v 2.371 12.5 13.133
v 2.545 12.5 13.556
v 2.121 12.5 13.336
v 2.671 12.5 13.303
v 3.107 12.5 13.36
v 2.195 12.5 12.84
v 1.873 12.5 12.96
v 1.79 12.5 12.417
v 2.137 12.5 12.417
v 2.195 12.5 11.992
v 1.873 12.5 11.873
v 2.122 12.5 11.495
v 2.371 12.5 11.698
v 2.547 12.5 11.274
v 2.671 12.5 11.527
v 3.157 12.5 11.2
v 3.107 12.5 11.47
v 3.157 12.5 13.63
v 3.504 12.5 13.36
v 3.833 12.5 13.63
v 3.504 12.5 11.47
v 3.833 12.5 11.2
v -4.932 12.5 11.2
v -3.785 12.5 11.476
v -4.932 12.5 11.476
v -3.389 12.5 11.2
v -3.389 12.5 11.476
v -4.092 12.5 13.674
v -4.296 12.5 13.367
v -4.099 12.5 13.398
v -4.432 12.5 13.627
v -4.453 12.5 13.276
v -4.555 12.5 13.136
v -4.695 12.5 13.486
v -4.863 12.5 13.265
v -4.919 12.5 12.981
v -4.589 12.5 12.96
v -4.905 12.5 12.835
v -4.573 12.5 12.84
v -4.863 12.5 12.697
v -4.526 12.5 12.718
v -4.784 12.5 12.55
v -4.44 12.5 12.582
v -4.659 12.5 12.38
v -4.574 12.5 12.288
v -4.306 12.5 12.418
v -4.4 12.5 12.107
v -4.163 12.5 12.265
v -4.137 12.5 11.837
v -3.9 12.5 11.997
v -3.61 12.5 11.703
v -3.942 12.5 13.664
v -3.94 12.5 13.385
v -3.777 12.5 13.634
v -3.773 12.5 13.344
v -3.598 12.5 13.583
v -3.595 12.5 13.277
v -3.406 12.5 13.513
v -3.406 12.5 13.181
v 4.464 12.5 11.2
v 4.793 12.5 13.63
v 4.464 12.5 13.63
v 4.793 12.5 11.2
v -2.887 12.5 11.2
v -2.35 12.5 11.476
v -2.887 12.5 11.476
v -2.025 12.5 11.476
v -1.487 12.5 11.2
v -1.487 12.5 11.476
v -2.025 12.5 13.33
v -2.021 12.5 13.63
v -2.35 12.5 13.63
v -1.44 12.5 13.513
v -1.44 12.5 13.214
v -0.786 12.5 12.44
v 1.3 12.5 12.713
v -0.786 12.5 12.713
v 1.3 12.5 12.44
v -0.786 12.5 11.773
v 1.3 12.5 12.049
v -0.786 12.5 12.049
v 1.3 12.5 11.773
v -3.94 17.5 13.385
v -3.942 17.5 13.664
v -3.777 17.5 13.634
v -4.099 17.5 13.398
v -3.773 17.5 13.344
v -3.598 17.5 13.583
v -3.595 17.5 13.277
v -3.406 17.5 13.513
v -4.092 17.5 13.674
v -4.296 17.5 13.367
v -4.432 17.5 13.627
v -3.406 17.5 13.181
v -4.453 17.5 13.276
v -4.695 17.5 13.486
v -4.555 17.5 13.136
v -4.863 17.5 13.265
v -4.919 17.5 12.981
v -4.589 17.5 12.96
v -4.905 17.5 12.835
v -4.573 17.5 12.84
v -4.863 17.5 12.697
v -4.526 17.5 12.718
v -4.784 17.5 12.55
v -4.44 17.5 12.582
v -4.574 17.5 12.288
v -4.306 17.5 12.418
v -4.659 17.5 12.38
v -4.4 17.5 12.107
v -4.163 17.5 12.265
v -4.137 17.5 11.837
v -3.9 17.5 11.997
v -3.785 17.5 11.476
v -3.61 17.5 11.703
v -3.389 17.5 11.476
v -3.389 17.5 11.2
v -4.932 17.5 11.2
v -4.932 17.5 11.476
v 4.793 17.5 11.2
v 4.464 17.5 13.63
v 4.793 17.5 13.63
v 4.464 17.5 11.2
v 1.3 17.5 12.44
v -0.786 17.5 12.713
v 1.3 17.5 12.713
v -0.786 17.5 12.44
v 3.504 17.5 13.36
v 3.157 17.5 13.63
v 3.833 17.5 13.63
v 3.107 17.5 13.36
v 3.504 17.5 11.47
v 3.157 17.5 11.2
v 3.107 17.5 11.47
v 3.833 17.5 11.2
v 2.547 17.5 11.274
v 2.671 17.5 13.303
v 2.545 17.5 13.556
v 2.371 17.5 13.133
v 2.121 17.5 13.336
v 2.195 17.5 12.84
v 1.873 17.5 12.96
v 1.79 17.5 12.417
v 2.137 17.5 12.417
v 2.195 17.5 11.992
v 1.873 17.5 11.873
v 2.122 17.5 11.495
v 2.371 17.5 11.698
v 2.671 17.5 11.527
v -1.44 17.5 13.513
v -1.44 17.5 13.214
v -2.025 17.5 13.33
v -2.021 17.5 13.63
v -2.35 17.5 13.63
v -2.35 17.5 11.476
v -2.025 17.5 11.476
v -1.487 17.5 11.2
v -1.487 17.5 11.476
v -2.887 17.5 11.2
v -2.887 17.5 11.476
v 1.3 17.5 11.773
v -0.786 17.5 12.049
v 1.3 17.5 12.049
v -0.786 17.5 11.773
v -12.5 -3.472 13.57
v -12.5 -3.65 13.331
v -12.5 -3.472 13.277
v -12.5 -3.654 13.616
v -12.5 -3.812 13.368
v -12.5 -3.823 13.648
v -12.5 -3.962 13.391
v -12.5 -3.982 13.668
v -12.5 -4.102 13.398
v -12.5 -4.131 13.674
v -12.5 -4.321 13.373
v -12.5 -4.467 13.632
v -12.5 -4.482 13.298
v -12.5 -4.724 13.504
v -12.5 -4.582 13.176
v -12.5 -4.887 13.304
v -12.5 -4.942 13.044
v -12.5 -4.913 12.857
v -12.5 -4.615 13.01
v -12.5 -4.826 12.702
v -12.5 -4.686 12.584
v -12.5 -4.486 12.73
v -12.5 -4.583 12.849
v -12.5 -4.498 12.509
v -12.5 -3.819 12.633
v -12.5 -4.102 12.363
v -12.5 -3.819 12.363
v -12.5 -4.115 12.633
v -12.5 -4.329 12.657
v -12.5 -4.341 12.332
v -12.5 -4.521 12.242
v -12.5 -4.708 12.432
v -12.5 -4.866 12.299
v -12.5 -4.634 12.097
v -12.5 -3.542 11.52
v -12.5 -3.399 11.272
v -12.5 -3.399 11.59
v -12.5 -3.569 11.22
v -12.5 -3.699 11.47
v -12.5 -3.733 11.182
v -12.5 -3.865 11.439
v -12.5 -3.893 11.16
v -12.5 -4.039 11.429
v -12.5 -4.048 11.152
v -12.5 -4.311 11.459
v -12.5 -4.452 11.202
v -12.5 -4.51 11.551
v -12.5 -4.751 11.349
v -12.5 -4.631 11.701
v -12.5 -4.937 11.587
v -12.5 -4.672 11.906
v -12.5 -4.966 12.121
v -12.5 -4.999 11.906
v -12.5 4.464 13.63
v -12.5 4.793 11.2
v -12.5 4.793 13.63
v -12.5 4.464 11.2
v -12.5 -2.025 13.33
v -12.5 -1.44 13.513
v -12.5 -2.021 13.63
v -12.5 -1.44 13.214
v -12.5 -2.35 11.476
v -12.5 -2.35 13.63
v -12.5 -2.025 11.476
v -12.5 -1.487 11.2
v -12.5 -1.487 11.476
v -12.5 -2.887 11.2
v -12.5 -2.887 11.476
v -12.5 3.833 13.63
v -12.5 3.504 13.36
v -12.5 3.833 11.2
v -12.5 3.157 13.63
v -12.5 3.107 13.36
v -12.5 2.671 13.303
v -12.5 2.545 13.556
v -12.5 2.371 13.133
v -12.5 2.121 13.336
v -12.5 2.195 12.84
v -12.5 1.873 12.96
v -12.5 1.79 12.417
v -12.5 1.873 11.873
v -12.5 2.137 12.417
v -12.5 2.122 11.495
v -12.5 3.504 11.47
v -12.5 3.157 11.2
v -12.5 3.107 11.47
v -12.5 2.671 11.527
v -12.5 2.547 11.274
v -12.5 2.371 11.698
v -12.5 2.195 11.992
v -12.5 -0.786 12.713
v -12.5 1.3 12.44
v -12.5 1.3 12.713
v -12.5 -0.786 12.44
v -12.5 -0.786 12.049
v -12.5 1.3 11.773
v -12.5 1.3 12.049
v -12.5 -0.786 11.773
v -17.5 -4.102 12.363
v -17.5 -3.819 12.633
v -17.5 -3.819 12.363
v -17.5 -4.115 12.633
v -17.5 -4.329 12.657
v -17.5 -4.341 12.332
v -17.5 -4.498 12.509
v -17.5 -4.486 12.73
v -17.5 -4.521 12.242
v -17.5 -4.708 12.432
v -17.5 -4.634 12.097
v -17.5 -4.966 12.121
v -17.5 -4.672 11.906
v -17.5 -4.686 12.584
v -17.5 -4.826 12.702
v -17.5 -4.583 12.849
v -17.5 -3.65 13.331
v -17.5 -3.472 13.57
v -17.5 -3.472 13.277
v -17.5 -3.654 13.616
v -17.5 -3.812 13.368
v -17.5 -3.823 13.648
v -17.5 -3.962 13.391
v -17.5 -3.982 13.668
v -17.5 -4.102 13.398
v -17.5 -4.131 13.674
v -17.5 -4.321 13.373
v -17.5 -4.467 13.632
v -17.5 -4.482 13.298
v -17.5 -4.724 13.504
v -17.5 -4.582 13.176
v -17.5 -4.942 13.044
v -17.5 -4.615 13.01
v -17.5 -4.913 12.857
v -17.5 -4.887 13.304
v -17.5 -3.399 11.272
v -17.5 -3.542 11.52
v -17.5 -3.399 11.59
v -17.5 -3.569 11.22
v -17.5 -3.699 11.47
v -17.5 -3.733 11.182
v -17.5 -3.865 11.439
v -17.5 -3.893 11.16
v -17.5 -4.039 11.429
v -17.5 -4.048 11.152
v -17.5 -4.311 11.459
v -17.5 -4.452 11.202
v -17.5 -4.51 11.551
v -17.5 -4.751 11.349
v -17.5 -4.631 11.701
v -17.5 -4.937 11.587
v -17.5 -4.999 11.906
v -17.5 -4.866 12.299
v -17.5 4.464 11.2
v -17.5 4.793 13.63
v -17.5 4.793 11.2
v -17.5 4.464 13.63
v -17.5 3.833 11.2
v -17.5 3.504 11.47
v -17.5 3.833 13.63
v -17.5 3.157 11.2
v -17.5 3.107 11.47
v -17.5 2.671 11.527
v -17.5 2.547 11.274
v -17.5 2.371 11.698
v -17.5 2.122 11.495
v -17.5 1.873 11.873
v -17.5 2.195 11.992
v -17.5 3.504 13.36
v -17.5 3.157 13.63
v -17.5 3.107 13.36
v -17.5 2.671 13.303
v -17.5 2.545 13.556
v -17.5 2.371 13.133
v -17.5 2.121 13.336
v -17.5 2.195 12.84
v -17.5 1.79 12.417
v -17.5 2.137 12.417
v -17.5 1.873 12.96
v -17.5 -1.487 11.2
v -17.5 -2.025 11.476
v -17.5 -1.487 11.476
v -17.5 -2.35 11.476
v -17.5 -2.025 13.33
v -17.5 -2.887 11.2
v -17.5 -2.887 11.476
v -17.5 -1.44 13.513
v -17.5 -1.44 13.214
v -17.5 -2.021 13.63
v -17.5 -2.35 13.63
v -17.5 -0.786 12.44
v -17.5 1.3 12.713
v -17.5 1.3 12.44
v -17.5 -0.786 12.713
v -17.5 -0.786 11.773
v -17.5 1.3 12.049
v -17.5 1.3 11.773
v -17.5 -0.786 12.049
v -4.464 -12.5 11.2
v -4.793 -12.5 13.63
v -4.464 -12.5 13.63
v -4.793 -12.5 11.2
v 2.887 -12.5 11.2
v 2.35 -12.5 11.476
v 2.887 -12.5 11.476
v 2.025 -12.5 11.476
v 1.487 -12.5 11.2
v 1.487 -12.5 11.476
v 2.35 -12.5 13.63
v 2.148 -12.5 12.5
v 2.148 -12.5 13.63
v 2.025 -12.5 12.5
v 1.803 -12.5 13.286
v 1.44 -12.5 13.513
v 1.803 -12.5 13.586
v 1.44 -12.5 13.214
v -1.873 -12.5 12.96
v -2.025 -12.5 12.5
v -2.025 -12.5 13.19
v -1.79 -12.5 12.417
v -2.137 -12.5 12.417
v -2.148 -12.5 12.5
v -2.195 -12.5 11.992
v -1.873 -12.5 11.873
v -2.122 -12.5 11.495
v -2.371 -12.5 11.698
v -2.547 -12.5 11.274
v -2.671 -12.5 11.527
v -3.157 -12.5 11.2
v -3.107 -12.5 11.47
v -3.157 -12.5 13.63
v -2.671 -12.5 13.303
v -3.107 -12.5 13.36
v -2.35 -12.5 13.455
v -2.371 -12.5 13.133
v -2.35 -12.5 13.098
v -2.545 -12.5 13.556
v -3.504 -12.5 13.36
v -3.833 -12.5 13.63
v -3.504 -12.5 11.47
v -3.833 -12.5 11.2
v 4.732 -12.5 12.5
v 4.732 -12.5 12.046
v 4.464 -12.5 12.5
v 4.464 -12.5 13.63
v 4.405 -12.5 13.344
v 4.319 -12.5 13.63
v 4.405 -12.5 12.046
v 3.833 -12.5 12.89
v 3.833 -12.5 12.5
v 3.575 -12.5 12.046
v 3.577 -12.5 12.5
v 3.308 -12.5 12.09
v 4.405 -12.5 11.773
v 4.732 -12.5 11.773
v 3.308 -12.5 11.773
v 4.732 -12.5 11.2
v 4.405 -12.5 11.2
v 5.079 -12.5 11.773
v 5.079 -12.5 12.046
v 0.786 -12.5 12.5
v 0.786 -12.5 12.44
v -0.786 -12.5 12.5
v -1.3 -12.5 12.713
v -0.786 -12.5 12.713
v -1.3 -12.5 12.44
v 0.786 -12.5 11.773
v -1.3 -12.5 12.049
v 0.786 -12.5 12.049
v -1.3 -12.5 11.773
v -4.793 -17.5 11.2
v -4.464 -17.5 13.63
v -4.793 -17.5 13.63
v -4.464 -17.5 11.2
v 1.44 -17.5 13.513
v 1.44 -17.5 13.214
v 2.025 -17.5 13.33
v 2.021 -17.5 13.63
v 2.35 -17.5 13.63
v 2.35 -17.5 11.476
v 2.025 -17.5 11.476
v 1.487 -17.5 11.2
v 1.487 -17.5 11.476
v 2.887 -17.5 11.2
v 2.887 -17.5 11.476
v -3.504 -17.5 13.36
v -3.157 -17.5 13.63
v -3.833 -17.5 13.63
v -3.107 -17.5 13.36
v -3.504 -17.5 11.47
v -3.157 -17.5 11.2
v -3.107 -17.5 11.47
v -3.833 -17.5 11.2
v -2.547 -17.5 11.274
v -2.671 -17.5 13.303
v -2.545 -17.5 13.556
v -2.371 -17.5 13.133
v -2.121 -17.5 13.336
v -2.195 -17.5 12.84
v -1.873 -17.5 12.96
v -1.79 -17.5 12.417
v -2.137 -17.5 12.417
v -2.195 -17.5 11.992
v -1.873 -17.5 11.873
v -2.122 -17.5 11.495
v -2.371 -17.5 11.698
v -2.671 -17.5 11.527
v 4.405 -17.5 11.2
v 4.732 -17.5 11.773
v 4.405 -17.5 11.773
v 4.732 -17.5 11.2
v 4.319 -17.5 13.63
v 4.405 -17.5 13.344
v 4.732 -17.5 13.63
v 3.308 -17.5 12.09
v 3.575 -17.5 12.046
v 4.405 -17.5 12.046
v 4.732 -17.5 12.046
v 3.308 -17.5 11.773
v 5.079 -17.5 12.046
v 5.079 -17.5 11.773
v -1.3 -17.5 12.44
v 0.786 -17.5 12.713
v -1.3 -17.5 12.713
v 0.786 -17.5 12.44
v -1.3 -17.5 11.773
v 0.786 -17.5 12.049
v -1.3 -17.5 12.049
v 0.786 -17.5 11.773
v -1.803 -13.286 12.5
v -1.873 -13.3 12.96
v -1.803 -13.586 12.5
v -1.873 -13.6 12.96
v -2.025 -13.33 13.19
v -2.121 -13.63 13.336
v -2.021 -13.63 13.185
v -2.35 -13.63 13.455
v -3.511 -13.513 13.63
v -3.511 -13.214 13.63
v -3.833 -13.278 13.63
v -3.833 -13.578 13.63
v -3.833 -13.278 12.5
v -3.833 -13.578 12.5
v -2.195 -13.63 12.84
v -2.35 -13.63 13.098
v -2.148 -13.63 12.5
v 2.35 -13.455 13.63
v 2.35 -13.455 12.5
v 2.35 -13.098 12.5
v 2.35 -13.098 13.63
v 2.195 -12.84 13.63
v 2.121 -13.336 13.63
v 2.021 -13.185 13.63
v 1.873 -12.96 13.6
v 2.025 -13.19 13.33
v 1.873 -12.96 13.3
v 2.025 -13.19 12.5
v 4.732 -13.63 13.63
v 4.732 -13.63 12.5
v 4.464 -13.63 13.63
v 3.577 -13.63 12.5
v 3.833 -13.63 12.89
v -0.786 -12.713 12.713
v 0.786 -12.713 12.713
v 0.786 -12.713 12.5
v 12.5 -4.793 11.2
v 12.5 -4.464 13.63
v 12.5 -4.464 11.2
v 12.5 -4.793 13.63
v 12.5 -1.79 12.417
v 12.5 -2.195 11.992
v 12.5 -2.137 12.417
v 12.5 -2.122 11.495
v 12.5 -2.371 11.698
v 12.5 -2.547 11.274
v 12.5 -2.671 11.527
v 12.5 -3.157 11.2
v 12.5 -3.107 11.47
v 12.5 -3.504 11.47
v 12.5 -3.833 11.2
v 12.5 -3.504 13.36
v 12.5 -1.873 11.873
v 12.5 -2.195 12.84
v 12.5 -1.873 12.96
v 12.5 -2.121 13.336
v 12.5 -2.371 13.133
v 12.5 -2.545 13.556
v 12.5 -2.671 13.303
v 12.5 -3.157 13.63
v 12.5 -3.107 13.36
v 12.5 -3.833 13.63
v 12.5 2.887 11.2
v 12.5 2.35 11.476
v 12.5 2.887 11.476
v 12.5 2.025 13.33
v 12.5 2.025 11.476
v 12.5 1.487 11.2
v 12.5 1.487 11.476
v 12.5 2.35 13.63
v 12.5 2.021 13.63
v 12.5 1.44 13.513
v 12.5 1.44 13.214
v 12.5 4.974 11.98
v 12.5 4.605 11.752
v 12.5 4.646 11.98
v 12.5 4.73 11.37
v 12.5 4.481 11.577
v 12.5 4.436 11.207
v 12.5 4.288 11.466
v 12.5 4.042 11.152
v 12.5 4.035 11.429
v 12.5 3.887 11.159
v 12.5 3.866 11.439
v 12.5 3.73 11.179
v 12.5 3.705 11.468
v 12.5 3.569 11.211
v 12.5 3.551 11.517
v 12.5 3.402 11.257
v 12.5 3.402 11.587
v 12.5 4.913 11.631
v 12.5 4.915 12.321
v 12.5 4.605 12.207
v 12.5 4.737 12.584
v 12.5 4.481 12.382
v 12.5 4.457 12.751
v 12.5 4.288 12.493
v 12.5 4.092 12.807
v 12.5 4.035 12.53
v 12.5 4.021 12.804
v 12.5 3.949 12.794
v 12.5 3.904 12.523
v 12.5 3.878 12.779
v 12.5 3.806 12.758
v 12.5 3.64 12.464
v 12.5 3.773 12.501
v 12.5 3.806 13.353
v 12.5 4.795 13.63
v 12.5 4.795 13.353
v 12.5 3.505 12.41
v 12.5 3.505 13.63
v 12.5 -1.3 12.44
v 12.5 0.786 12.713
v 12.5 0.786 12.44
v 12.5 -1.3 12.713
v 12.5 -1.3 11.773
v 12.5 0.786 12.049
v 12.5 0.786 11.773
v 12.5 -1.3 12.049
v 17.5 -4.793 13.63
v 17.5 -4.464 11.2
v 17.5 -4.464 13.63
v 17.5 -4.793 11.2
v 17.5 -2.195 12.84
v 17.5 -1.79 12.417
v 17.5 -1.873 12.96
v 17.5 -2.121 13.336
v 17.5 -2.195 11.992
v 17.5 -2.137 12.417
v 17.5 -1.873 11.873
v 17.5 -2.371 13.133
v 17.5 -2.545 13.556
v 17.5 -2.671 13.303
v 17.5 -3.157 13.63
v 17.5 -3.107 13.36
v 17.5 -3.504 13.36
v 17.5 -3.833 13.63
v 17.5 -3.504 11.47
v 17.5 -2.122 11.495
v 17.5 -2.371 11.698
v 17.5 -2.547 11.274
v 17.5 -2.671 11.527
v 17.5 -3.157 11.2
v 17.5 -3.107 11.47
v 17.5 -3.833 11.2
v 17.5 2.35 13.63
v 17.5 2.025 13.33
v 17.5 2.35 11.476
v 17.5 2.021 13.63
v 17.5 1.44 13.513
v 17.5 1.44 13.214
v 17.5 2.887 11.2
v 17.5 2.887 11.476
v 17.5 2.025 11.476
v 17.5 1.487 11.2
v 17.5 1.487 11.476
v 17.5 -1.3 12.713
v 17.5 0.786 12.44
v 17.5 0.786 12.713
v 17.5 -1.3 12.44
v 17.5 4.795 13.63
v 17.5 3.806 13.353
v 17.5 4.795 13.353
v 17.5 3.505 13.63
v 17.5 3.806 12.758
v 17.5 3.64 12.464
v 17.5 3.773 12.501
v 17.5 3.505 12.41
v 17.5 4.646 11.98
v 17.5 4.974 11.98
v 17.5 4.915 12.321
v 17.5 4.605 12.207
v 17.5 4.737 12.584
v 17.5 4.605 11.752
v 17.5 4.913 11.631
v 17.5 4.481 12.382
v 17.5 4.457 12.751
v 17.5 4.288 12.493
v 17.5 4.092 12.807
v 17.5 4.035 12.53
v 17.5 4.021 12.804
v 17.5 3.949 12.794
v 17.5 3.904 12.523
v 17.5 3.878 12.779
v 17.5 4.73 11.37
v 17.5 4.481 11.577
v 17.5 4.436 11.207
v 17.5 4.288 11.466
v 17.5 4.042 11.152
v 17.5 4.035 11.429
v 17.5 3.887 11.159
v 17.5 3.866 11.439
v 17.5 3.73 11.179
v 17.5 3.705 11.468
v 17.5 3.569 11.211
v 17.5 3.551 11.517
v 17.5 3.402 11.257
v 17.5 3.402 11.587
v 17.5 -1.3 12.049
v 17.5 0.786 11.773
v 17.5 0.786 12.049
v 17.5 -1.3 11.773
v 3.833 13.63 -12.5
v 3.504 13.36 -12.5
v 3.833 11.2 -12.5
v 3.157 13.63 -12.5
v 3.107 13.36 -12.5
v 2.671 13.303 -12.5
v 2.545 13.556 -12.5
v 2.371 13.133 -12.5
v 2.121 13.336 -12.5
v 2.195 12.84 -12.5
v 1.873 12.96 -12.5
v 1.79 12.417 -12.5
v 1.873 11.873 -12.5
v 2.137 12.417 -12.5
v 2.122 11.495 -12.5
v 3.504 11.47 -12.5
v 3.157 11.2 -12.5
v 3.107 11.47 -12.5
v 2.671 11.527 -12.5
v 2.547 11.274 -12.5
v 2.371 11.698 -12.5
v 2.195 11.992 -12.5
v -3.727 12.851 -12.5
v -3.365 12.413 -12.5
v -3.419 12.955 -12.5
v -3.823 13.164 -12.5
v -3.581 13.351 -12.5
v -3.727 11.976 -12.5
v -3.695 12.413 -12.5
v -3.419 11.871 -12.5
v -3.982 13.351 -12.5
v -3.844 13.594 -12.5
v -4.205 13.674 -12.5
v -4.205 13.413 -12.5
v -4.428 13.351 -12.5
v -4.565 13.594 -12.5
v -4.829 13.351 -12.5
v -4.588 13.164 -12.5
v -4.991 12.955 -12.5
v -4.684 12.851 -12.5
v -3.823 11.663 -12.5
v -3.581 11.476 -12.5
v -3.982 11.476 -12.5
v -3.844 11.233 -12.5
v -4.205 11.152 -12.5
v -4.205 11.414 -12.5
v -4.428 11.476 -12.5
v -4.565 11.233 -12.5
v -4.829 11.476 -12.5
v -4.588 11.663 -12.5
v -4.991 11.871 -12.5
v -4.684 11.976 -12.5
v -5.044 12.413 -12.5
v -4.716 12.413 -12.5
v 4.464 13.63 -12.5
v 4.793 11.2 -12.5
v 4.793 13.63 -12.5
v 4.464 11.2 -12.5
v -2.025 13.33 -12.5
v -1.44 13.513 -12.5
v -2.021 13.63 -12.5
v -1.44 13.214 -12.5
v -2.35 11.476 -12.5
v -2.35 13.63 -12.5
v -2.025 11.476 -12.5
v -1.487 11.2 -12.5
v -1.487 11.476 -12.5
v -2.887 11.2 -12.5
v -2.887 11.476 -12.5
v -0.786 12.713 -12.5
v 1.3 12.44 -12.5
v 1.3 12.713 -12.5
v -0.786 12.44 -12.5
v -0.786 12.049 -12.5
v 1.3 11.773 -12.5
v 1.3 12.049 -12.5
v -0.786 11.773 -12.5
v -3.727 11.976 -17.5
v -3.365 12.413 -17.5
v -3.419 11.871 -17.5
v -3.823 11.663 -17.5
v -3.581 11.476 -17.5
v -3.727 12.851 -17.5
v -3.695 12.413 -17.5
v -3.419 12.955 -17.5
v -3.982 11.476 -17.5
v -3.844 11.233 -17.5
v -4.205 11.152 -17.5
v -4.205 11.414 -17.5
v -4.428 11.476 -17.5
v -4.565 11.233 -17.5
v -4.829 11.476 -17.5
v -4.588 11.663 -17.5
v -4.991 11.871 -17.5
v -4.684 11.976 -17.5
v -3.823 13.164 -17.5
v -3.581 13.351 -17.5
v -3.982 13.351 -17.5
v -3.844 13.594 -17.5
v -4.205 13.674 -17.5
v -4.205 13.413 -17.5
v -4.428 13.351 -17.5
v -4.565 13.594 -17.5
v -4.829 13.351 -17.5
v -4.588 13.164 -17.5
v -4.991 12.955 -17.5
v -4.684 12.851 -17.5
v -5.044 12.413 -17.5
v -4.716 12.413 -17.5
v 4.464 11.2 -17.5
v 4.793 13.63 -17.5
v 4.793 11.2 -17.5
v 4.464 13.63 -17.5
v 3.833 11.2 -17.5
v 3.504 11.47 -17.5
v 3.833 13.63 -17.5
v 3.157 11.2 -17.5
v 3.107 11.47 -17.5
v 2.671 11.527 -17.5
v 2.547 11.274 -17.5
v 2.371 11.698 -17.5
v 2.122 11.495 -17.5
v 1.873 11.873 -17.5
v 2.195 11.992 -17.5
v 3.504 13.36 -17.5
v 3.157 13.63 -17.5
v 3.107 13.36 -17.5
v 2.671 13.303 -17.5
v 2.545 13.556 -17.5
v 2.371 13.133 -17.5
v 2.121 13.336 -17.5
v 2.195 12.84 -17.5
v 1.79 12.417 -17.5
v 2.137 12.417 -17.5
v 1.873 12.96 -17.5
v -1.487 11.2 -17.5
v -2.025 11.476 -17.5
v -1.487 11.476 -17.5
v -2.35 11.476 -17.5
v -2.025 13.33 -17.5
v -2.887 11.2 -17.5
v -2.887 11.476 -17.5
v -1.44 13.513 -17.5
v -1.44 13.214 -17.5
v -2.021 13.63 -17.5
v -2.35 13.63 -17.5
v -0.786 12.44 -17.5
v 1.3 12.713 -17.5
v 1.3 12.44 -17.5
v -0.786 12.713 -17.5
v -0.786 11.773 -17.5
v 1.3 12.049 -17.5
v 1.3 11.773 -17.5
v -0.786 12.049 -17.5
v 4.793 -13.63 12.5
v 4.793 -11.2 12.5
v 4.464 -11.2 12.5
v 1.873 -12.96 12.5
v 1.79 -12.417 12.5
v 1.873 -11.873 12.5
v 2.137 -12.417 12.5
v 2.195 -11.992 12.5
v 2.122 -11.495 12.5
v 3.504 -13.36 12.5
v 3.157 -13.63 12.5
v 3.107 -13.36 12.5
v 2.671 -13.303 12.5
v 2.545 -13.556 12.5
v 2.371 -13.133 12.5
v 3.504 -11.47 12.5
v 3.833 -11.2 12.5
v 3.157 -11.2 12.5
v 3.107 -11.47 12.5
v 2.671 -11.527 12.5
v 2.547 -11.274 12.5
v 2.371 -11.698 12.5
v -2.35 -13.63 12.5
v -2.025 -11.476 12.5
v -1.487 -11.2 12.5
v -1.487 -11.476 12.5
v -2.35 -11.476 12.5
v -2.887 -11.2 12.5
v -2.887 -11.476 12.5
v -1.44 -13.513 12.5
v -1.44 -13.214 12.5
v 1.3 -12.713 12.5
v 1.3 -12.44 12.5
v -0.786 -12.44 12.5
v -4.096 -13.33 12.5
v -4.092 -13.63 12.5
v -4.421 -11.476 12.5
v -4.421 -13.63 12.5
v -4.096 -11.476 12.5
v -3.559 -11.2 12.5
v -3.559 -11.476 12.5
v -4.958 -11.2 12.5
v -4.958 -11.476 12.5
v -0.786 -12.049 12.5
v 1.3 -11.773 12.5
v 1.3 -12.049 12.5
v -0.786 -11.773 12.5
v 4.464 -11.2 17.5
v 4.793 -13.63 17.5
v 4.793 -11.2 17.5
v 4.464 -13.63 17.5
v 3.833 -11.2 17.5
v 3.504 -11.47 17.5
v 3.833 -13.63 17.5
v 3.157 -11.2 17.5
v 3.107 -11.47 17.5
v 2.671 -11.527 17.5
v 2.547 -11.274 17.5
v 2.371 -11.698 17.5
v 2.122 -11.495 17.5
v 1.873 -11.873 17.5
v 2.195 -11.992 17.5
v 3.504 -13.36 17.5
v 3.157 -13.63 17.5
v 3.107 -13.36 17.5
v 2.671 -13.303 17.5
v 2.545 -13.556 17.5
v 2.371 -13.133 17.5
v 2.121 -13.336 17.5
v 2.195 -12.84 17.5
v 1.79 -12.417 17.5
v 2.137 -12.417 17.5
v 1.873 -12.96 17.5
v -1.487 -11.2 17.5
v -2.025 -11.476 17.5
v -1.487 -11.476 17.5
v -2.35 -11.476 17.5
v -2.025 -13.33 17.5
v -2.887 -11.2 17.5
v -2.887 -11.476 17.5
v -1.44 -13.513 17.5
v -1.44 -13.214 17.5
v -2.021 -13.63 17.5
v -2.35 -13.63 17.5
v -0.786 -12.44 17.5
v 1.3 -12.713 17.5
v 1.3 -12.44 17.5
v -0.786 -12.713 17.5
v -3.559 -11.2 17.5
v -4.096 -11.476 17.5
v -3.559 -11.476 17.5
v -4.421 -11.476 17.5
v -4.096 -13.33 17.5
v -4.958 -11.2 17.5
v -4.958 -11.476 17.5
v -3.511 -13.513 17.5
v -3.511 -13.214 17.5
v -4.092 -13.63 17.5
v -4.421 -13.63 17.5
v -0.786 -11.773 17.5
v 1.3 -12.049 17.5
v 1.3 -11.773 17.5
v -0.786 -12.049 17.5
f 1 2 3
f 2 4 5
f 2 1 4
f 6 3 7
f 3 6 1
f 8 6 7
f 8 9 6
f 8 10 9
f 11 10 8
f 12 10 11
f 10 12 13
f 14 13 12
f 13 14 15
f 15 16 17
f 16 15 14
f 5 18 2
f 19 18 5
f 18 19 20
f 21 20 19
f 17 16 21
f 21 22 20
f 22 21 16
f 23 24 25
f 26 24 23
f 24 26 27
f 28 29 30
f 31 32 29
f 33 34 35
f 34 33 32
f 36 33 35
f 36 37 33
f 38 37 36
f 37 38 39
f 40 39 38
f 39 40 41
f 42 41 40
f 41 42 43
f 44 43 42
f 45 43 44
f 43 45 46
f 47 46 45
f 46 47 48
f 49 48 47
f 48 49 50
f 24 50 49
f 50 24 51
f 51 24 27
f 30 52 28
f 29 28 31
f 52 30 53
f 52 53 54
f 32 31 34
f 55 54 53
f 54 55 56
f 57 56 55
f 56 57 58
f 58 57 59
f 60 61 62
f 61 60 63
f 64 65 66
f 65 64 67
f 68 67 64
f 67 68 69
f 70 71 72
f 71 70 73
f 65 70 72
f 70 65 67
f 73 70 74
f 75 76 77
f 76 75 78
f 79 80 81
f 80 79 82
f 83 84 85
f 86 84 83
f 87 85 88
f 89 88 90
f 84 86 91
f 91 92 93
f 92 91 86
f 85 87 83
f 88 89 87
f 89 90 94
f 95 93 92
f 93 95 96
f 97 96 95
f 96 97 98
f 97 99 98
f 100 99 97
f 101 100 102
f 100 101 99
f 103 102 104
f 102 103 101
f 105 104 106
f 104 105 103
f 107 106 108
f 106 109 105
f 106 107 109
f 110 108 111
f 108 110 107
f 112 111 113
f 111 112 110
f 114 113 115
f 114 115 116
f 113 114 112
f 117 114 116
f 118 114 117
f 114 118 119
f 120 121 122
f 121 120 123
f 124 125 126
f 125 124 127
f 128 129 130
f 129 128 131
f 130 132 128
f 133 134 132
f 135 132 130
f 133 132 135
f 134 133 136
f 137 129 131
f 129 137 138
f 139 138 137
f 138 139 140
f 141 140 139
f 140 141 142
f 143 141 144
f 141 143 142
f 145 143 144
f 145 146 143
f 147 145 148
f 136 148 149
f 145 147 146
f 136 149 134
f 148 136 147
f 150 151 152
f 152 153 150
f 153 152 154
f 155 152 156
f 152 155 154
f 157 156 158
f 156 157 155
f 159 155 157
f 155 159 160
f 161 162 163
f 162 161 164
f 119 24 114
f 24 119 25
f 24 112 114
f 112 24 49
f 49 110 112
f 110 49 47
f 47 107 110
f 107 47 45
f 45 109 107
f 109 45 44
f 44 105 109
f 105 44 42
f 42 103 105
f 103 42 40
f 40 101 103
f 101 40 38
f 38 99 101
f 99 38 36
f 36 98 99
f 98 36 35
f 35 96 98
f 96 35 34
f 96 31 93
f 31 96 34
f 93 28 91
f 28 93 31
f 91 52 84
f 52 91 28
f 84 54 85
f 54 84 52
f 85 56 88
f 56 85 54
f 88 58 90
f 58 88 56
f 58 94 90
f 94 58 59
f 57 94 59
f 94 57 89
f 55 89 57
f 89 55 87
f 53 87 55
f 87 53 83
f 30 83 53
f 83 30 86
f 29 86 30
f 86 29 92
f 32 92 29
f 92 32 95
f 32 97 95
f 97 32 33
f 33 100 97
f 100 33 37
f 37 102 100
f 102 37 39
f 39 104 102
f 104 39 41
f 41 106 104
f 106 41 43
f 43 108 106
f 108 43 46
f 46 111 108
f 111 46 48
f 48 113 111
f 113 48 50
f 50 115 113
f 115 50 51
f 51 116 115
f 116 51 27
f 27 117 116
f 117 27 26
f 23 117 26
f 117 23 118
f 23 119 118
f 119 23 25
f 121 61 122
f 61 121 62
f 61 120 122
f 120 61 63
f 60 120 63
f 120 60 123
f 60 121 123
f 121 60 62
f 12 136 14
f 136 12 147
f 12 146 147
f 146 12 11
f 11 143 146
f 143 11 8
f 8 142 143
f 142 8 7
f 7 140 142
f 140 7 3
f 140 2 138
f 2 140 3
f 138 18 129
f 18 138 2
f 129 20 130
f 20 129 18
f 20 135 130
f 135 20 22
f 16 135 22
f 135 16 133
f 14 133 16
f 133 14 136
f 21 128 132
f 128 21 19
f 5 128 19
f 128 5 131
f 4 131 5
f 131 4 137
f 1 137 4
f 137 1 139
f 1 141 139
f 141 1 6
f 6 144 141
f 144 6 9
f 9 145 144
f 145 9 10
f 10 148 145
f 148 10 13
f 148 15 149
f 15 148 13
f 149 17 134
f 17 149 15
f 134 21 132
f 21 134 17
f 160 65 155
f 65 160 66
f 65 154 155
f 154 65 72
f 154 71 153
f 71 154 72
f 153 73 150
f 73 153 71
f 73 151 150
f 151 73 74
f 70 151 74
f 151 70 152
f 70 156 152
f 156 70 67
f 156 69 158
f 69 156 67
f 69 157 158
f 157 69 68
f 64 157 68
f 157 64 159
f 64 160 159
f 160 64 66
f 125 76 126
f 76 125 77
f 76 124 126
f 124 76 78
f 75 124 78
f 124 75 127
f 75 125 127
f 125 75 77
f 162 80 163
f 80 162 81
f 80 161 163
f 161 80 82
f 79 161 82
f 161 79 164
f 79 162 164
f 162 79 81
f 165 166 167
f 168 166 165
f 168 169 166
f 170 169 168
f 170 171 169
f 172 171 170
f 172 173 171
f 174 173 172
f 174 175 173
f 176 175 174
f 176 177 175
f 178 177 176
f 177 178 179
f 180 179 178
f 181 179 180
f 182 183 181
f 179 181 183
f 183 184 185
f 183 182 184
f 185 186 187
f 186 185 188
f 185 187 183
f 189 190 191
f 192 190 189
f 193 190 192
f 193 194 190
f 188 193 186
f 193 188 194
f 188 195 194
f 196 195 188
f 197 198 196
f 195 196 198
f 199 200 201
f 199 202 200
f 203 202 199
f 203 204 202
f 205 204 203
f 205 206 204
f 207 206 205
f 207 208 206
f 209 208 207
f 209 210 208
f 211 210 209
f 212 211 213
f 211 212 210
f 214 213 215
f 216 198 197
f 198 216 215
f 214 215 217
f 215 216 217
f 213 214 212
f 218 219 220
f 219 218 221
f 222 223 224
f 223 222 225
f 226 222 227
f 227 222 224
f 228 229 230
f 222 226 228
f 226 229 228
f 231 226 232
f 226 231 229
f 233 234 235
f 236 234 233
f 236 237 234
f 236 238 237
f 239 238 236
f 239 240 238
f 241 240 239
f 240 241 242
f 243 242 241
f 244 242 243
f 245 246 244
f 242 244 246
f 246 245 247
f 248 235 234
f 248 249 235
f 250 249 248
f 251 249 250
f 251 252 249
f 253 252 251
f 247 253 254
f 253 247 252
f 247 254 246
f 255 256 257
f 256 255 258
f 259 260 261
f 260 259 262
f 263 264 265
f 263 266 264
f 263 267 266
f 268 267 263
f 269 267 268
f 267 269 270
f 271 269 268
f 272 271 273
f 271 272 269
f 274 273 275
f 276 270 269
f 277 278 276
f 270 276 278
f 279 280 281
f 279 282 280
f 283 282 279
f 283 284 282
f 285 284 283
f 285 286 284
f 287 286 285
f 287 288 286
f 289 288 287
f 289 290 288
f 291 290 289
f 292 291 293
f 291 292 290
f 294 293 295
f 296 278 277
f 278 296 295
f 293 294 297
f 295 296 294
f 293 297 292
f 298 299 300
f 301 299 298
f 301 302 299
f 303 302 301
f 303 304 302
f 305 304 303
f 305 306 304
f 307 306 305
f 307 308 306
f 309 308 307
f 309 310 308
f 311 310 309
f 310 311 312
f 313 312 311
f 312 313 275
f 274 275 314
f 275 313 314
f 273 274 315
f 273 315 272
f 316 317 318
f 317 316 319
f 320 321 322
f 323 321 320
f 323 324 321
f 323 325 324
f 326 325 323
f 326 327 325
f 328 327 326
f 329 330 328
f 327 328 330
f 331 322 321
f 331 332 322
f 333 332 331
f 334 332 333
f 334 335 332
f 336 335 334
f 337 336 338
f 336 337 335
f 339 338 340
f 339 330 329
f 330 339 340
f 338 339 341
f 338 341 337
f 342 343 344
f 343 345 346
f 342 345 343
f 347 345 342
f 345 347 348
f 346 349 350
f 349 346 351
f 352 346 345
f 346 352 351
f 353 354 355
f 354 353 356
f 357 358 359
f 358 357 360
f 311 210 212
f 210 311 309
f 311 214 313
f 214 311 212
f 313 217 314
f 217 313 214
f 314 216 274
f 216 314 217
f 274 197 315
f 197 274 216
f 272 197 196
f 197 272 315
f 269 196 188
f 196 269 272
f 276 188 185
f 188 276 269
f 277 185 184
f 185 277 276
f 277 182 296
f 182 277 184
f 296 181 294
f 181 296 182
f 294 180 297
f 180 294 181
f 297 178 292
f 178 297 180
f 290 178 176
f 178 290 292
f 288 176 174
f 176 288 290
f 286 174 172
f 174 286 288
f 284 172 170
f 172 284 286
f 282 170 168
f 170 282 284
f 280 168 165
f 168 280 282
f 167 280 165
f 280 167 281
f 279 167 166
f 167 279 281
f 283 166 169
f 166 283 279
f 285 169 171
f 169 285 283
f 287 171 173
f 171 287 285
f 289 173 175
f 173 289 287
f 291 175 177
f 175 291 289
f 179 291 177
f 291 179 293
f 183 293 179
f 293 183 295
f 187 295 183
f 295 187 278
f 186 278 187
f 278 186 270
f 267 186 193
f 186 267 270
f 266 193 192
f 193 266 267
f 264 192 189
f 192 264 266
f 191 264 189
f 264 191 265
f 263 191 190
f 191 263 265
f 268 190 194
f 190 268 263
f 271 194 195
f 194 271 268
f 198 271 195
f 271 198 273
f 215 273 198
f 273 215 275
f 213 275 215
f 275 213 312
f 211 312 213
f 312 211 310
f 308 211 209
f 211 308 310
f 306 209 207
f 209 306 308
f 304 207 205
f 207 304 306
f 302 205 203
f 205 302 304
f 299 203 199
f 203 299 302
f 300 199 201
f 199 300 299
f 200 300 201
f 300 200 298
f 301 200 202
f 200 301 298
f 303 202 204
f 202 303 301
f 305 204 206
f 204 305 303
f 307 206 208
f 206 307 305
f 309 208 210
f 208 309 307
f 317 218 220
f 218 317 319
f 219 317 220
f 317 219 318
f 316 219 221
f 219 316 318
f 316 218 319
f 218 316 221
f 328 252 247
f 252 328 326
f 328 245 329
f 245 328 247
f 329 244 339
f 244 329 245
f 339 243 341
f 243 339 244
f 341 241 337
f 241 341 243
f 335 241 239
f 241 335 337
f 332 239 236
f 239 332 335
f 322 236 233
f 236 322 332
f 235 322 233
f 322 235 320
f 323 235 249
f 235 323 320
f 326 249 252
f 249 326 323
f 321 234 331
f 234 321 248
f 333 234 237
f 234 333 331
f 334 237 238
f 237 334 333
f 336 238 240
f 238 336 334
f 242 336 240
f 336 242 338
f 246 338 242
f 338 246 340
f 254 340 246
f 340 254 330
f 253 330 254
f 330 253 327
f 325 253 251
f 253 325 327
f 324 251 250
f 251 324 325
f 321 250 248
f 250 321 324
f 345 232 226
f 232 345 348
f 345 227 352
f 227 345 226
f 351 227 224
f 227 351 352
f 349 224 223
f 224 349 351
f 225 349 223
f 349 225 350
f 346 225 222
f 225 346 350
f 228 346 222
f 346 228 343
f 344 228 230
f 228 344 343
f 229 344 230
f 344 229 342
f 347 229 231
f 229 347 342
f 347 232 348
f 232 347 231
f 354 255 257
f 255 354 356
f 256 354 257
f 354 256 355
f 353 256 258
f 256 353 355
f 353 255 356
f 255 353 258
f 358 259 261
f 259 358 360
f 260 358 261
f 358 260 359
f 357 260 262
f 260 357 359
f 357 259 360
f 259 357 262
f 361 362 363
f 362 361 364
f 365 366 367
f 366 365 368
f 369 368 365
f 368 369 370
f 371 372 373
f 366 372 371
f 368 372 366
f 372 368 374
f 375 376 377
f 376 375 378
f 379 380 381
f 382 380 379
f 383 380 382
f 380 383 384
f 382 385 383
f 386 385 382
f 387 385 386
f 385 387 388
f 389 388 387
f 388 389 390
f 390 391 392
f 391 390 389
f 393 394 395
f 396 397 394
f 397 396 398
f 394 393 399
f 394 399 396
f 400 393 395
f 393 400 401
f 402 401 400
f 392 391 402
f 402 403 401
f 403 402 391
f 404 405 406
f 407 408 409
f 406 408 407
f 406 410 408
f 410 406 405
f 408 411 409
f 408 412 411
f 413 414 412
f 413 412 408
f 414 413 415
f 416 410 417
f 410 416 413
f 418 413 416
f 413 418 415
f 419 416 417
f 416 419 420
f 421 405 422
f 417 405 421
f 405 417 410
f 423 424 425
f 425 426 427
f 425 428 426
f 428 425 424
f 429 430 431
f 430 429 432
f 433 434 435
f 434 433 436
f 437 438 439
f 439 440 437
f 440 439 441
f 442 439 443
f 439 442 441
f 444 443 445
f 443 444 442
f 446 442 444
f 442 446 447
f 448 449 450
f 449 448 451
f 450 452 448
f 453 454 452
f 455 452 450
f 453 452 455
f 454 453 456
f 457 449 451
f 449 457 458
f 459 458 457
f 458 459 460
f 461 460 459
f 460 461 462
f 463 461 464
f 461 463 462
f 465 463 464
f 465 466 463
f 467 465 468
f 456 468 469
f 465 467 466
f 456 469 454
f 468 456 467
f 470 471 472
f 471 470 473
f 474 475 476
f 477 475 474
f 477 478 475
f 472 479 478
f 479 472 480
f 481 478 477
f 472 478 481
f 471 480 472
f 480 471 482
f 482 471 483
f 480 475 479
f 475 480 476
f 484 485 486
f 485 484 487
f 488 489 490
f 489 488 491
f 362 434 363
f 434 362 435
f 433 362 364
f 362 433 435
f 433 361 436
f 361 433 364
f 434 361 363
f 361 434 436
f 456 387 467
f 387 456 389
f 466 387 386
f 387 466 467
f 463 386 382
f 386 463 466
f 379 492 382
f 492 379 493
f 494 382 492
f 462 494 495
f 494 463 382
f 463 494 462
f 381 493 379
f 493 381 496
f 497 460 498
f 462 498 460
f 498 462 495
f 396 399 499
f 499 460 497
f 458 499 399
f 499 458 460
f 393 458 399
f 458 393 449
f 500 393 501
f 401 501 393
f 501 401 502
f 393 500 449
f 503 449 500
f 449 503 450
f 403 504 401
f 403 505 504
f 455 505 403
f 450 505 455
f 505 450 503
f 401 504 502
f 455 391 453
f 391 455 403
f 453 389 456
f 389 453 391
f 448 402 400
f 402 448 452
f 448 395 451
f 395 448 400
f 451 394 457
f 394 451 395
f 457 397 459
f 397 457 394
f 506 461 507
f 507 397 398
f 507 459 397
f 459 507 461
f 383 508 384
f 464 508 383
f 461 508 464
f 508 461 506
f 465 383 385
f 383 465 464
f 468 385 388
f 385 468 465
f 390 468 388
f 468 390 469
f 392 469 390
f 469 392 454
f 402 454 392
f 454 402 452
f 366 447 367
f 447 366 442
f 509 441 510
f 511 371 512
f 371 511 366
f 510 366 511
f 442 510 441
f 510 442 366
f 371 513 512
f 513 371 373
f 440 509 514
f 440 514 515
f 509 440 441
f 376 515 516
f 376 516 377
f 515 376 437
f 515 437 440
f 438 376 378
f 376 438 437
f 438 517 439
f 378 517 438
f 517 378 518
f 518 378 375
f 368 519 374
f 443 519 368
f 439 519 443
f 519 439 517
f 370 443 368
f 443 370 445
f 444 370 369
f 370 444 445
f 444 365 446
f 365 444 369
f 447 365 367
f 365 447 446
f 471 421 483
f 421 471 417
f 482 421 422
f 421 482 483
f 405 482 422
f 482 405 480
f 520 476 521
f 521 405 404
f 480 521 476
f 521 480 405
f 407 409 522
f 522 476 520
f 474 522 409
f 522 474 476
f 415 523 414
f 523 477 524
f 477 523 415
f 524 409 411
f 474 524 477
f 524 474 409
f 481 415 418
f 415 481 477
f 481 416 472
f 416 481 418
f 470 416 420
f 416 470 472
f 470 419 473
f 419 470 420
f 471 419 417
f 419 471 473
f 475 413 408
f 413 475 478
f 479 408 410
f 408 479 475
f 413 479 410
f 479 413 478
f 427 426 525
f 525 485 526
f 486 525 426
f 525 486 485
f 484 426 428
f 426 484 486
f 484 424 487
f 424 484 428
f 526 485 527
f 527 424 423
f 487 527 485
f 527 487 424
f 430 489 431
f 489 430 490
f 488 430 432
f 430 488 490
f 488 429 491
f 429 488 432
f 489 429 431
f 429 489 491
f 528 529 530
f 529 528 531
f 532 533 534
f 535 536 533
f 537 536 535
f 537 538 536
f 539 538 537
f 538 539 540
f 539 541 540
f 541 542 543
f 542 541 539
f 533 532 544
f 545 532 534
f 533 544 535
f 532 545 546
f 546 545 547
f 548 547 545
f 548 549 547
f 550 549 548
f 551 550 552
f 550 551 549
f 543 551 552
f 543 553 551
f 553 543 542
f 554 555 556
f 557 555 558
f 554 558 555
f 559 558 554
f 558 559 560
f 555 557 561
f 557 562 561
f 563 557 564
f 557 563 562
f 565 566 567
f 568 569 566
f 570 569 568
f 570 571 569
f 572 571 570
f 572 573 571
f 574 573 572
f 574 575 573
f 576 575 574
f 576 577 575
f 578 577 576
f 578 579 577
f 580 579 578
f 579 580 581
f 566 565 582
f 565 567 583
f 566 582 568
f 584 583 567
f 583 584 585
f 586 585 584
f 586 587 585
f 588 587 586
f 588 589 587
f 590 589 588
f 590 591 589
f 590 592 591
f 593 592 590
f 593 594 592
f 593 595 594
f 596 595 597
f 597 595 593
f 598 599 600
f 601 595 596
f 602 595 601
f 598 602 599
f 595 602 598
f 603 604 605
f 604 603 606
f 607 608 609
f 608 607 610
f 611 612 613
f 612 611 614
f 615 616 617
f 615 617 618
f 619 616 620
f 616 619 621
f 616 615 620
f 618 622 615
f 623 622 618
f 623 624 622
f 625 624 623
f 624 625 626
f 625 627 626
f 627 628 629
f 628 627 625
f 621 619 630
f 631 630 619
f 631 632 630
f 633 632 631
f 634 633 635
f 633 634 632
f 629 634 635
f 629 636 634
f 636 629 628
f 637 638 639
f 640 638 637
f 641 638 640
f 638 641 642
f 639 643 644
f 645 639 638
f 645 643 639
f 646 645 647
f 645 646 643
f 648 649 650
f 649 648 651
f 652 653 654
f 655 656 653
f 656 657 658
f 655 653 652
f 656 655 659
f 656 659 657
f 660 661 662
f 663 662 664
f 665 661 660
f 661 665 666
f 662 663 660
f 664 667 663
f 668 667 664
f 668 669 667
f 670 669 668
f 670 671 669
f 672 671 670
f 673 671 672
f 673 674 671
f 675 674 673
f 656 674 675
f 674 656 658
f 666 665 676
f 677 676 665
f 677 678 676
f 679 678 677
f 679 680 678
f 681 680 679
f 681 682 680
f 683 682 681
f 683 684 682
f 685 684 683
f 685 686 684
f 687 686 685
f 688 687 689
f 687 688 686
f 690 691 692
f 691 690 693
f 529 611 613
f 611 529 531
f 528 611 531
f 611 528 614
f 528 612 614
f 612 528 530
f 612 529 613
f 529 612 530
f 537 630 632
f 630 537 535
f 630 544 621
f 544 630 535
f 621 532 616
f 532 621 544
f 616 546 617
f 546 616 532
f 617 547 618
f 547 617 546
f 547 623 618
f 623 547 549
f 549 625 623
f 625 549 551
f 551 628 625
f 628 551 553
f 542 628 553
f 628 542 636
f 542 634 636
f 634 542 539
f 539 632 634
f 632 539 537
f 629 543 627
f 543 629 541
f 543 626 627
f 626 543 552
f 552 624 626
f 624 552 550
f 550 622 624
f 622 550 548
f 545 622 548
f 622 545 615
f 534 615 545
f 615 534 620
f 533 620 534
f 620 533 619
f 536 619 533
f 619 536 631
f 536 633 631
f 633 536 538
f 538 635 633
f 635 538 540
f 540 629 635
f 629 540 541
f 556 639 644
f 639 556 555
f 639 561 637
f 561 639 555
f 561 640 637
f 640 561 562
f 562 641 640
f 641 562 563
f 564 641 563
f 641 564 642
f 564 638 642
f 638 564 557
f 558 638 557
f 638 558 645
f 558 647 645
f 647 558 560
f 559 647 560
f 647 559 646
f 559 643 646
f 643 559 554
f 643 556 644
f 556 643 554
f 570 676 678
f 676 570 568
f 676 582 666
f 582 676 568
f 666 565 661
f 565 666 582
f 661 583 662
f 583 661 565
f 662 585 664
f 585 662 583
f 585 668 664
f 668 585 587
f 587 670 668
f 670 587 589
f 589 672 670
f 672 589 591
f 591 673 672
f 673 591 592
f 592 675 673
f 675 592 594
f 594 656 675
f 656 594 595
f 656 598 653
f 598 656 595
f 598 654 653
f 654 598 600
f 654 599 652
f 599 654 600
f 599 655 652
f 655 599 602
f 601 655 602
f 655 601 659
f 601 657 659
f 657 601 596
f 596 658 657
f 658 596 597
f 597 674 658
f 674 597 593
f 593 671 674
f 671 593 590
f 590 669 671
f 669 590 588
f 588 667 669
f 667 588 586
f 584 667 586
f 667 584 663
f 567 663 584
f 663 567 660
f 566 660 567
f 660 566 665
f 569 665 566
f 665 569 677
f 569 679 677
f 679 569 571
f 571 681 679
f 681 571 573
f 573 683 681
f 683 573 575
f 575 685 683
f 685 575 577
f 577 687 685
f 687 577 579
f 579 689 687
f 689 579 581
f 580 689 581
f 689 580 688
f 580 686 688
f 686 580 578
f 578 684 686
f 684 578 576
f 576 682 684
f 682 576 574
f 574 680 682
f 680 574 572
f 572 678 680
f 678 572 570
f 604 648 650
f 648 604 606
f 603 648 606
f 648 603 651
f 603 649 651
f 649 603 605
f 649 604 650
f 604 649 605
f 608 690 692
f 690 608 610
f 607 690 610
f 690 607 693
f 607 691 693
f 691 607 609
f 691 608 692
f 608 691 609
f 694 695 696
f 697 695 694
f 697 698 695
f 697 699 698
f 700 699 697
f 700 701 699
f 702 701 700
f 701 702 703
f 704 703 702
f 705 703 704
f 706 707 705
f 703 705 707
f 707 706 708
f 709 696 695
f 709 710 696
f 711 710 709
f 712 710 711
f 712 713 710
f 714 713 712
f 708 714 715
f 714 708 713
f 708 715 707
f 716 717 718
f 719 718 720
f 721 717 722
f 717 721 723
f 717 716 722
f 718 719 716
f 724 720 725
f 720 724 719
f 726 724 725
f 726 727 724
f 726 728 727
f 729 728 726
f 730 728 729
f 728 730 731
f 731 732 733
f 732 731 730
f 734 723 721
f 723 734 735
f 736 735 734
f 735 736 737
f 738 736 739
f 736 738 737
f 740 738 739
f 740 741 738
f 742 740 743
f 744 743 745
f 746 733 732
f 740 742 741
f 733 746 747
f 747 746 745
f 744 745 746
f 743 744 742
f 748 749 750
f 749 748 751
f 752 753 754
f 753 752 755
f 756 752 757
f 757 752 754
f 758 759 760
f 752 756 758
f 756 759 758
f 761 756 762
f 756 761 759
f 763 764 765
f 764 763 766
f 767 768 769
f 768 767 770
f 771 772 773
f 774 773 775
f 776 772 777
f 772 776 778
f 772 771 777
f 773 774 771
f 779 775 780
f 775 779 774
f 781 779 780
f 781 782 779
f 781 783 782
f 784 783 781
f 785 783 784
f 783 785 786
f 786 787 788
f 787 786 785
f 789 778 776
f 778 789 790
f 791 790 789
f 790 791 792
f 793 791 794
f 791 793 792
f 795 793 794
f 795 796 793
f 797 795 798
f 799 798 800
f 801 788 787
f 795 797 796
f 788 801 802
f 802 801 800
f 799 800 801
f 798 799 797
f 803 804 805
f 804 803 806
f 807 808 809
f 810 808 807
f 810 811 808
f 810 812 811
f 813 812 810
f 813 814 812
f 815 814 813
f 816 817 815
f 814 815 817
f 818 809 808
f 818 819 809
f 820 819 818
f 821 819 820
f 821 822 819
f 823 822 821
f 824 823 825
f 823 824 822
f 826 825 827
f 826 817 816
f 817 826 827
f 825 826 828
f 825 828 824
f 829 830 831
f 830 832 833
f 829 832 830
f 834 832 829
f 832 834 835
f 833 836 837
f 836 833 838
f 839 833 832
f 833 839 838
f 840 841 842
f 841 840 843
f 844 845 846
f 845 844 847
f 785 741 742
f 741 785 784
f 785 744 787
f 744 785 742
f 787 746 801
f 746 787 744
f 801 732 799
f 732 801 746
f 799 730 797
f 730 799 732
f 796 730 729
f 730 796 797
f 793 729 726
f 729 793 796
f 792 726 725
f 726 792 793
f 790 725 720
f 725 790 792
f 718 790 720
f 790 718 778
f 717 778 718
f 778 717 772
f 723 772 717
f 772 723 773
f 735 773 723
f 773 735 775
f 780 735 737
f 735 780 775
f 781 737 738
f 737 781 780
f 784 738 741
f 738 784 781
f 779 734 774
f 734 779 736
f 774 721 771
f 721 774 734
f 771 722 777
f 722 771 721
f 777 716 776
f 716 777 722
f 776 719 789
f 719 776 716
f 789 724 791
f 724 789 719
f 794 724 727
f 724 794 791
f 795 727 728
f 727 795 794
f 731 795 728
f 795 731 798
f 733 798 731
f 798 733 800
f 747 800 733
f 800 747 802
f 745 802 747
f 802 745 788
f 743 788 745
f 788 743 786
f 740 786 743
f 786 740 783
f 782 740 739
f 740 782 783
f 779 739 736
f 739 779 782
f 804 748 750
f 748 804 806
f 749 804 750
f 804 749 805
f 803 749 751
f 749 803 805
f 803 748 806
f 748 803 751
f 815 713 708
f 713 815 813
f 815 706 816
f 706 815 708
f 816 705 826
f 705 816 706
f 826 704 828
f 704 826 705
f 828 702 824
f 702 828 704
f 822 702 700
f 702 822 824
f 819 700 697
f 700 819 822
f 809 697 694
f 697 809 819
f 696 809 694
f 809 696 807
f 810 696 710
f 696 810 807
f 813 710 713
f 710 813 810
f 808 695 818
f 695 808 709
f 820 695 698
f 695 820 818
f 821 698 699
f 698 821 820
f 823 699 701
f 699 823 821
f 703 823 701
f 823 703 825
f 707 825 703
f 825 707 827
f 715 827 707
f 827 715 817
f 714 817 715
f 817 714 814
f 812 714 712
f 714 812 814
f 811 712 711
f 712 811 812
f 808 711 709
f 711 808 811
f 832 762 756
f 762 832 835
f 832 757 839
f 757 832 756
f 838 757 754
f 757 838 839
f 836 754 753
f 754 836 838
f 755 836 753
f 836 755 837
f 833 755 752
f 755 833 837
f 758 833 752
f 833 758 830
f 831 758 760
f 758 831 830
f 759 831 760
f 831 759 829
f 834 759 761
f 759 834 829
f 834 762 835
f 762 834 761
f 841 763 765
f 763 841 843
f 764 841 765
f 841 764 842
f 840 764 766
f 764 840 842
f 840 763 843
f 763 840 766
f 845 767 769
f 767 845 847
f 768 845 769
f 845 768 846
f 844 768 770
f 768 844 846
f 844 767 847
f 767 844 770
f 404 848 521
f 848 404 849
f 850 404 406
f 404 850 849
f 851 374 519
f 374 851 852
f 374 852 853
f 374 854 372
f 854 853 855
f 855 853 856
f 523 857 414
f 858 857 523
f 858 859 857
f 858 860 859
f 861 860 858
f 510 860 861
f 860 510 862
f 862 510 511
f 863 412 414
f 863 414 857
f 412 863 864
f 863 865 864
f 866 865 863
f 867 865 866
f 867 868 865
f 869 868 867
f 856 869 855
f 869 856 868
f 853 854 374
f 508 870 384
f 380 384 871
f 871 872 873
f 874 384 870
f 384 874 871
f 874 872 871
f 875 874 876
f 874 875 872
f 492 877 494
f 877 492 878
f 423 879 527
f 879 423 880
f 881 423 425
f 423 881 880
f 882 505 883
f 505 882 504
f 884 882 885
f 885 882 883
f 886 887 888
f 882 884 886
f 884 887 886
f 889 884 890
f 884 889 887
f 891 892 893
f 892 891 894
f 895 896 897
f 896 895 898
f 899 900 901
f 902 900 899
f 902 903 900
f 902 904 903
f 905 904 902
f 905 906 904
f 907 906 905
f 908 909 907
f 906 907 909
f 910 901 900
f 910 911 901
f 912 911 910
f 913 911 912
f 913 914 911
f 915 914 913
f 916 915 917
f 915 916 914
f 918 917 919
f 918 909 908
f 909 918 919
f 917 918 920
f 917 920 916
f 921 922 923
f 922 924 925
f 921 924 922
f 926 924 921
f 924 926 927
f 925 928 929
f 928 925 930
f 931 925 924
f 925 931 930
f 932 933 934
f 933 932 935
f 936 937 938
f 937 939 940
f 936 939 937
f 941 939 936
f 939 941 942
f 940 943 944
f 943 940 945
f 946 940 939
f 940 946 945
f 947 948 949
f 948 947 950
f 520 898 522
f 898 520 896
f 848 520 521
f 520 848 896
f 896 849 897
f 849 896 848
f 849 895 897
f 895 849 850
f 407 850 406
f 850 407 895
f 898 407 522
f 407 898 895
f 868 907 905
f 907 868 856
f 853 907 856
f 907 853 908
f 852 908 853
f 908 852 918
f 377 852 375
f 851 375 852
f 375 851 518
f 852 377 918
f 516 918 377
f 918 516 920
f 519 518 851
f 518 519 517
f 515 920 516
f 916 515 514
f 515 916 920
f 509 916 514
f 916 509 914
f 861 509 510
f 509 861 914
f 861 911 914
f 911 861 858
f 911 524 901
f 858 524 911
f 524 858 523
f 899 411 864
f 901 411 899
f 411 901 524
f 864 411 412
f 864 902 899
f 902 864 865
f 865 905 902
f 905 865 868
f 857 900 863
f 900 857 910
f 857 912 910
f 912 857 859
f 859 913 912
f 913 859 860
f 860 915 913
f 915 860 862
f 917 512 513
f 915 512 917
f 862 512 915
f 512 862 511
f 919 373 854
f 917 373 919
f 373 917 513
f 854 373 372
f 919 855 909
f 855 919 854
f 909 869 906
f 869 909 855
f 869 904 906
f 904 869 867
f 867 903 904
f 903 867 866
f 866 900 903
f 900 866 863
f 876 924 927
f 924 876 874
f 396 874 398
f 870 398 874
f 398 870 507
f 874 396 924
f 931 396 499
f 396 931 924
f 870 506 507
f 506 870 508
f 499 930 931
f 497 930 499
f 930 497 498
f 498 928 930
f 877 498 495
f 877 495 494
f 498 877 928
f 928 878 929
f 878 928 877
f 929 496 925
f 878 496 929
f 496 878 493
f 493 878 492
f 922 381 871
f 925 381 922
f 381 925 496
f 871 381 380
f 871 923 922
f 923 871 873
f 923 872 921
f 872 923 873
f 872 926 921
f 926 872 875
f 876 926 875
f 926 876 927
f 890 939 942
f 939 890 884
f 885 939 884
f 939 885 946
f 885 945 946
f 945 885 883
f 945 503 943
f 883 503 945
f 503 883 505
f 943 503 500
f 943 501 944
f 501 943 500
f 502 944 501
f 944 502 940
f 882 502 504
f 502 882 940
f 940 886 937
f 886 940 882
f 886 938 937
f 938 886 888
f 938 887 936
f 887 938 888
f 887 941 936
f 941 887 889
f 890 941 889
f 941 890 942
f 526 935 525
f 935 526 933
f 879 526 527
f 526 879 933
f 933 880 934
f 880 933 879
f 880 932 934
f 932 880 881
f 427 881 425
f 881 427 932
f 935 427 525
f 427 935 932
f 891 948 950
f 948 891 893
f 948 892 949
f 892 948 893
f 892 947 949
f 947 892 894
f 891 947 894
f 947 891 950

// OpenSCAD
// file: modules.scad
offset = [0,8,0];
zoom = [0.8,0.8,1];

module white( filename, text)
{
    translate(offset+[0,-4,0])   scale(zoom)
    rotate([180,0,-90]) 
    union(){ 
        translate([-14,-6.4,-2.5])   rotate([0,0,90])  linear_extrude(5)  text (text,font="bold",size=3); 
        intersection() 
        {    
            cube([35,35,5],center=true); 
            translate([1.5,0,2.6])   linear_extrude(5) scale([0.14,0.14,-1])surface(file = filename, center = true); 
        } 
    } 

};

module black( filename, text)
{
    translate(offset+[0,-4,0])   scale(zoom)
    rotate([180,0,-90]) 
    difference() 
    {    
        cube([35,35,5],center=true); 
        translate([1.5,0,2.6])    scale([0.14,0.14,-1]) surface(file = filename, center = true);
        translate([-14,-6.4,-2.5])   rotate([0,0,90])  linear_extrude(6)  text (text,font="bold",size=3);
    } 
}

module shape()
{
    translate(offset)   scale(zoom) rotate([180,0,0]) 
    {
        rotate([0,0,90]) translate([5,0,0])  cube([35,35,5.5],center=true);  
        linear_extrude(5)  translate([-9,-4,0])   text("B",size=20);
    }
    
}
// main file
include <modules.scad>

union() color([0,1,0])
{
    translate([0,-4,-15])                     white("../aruco/Marker10.png","ID=10");     
    rotate([180,0,0])    translate([0,-4,-15])white("../aruco/Marker11.png","ID=11");  
    rotate([90,0,0])
    {
        translate([0,-4,-15])       white("../aruco/Marker12.png","ID=12");  
        rotate([0,90,0])   translate([0,-4,-15])  white("../aruco/Marker13.png","ID=13");  
        rotate([0,180,0])   translate([0,-4,-15]) white("../aruco/Marker14.png","ID=14");  
        rotate([0,270,0])   translate([0,-4,-15]) white("../aruco/Marker15.png","ID=15");  
    }
}
